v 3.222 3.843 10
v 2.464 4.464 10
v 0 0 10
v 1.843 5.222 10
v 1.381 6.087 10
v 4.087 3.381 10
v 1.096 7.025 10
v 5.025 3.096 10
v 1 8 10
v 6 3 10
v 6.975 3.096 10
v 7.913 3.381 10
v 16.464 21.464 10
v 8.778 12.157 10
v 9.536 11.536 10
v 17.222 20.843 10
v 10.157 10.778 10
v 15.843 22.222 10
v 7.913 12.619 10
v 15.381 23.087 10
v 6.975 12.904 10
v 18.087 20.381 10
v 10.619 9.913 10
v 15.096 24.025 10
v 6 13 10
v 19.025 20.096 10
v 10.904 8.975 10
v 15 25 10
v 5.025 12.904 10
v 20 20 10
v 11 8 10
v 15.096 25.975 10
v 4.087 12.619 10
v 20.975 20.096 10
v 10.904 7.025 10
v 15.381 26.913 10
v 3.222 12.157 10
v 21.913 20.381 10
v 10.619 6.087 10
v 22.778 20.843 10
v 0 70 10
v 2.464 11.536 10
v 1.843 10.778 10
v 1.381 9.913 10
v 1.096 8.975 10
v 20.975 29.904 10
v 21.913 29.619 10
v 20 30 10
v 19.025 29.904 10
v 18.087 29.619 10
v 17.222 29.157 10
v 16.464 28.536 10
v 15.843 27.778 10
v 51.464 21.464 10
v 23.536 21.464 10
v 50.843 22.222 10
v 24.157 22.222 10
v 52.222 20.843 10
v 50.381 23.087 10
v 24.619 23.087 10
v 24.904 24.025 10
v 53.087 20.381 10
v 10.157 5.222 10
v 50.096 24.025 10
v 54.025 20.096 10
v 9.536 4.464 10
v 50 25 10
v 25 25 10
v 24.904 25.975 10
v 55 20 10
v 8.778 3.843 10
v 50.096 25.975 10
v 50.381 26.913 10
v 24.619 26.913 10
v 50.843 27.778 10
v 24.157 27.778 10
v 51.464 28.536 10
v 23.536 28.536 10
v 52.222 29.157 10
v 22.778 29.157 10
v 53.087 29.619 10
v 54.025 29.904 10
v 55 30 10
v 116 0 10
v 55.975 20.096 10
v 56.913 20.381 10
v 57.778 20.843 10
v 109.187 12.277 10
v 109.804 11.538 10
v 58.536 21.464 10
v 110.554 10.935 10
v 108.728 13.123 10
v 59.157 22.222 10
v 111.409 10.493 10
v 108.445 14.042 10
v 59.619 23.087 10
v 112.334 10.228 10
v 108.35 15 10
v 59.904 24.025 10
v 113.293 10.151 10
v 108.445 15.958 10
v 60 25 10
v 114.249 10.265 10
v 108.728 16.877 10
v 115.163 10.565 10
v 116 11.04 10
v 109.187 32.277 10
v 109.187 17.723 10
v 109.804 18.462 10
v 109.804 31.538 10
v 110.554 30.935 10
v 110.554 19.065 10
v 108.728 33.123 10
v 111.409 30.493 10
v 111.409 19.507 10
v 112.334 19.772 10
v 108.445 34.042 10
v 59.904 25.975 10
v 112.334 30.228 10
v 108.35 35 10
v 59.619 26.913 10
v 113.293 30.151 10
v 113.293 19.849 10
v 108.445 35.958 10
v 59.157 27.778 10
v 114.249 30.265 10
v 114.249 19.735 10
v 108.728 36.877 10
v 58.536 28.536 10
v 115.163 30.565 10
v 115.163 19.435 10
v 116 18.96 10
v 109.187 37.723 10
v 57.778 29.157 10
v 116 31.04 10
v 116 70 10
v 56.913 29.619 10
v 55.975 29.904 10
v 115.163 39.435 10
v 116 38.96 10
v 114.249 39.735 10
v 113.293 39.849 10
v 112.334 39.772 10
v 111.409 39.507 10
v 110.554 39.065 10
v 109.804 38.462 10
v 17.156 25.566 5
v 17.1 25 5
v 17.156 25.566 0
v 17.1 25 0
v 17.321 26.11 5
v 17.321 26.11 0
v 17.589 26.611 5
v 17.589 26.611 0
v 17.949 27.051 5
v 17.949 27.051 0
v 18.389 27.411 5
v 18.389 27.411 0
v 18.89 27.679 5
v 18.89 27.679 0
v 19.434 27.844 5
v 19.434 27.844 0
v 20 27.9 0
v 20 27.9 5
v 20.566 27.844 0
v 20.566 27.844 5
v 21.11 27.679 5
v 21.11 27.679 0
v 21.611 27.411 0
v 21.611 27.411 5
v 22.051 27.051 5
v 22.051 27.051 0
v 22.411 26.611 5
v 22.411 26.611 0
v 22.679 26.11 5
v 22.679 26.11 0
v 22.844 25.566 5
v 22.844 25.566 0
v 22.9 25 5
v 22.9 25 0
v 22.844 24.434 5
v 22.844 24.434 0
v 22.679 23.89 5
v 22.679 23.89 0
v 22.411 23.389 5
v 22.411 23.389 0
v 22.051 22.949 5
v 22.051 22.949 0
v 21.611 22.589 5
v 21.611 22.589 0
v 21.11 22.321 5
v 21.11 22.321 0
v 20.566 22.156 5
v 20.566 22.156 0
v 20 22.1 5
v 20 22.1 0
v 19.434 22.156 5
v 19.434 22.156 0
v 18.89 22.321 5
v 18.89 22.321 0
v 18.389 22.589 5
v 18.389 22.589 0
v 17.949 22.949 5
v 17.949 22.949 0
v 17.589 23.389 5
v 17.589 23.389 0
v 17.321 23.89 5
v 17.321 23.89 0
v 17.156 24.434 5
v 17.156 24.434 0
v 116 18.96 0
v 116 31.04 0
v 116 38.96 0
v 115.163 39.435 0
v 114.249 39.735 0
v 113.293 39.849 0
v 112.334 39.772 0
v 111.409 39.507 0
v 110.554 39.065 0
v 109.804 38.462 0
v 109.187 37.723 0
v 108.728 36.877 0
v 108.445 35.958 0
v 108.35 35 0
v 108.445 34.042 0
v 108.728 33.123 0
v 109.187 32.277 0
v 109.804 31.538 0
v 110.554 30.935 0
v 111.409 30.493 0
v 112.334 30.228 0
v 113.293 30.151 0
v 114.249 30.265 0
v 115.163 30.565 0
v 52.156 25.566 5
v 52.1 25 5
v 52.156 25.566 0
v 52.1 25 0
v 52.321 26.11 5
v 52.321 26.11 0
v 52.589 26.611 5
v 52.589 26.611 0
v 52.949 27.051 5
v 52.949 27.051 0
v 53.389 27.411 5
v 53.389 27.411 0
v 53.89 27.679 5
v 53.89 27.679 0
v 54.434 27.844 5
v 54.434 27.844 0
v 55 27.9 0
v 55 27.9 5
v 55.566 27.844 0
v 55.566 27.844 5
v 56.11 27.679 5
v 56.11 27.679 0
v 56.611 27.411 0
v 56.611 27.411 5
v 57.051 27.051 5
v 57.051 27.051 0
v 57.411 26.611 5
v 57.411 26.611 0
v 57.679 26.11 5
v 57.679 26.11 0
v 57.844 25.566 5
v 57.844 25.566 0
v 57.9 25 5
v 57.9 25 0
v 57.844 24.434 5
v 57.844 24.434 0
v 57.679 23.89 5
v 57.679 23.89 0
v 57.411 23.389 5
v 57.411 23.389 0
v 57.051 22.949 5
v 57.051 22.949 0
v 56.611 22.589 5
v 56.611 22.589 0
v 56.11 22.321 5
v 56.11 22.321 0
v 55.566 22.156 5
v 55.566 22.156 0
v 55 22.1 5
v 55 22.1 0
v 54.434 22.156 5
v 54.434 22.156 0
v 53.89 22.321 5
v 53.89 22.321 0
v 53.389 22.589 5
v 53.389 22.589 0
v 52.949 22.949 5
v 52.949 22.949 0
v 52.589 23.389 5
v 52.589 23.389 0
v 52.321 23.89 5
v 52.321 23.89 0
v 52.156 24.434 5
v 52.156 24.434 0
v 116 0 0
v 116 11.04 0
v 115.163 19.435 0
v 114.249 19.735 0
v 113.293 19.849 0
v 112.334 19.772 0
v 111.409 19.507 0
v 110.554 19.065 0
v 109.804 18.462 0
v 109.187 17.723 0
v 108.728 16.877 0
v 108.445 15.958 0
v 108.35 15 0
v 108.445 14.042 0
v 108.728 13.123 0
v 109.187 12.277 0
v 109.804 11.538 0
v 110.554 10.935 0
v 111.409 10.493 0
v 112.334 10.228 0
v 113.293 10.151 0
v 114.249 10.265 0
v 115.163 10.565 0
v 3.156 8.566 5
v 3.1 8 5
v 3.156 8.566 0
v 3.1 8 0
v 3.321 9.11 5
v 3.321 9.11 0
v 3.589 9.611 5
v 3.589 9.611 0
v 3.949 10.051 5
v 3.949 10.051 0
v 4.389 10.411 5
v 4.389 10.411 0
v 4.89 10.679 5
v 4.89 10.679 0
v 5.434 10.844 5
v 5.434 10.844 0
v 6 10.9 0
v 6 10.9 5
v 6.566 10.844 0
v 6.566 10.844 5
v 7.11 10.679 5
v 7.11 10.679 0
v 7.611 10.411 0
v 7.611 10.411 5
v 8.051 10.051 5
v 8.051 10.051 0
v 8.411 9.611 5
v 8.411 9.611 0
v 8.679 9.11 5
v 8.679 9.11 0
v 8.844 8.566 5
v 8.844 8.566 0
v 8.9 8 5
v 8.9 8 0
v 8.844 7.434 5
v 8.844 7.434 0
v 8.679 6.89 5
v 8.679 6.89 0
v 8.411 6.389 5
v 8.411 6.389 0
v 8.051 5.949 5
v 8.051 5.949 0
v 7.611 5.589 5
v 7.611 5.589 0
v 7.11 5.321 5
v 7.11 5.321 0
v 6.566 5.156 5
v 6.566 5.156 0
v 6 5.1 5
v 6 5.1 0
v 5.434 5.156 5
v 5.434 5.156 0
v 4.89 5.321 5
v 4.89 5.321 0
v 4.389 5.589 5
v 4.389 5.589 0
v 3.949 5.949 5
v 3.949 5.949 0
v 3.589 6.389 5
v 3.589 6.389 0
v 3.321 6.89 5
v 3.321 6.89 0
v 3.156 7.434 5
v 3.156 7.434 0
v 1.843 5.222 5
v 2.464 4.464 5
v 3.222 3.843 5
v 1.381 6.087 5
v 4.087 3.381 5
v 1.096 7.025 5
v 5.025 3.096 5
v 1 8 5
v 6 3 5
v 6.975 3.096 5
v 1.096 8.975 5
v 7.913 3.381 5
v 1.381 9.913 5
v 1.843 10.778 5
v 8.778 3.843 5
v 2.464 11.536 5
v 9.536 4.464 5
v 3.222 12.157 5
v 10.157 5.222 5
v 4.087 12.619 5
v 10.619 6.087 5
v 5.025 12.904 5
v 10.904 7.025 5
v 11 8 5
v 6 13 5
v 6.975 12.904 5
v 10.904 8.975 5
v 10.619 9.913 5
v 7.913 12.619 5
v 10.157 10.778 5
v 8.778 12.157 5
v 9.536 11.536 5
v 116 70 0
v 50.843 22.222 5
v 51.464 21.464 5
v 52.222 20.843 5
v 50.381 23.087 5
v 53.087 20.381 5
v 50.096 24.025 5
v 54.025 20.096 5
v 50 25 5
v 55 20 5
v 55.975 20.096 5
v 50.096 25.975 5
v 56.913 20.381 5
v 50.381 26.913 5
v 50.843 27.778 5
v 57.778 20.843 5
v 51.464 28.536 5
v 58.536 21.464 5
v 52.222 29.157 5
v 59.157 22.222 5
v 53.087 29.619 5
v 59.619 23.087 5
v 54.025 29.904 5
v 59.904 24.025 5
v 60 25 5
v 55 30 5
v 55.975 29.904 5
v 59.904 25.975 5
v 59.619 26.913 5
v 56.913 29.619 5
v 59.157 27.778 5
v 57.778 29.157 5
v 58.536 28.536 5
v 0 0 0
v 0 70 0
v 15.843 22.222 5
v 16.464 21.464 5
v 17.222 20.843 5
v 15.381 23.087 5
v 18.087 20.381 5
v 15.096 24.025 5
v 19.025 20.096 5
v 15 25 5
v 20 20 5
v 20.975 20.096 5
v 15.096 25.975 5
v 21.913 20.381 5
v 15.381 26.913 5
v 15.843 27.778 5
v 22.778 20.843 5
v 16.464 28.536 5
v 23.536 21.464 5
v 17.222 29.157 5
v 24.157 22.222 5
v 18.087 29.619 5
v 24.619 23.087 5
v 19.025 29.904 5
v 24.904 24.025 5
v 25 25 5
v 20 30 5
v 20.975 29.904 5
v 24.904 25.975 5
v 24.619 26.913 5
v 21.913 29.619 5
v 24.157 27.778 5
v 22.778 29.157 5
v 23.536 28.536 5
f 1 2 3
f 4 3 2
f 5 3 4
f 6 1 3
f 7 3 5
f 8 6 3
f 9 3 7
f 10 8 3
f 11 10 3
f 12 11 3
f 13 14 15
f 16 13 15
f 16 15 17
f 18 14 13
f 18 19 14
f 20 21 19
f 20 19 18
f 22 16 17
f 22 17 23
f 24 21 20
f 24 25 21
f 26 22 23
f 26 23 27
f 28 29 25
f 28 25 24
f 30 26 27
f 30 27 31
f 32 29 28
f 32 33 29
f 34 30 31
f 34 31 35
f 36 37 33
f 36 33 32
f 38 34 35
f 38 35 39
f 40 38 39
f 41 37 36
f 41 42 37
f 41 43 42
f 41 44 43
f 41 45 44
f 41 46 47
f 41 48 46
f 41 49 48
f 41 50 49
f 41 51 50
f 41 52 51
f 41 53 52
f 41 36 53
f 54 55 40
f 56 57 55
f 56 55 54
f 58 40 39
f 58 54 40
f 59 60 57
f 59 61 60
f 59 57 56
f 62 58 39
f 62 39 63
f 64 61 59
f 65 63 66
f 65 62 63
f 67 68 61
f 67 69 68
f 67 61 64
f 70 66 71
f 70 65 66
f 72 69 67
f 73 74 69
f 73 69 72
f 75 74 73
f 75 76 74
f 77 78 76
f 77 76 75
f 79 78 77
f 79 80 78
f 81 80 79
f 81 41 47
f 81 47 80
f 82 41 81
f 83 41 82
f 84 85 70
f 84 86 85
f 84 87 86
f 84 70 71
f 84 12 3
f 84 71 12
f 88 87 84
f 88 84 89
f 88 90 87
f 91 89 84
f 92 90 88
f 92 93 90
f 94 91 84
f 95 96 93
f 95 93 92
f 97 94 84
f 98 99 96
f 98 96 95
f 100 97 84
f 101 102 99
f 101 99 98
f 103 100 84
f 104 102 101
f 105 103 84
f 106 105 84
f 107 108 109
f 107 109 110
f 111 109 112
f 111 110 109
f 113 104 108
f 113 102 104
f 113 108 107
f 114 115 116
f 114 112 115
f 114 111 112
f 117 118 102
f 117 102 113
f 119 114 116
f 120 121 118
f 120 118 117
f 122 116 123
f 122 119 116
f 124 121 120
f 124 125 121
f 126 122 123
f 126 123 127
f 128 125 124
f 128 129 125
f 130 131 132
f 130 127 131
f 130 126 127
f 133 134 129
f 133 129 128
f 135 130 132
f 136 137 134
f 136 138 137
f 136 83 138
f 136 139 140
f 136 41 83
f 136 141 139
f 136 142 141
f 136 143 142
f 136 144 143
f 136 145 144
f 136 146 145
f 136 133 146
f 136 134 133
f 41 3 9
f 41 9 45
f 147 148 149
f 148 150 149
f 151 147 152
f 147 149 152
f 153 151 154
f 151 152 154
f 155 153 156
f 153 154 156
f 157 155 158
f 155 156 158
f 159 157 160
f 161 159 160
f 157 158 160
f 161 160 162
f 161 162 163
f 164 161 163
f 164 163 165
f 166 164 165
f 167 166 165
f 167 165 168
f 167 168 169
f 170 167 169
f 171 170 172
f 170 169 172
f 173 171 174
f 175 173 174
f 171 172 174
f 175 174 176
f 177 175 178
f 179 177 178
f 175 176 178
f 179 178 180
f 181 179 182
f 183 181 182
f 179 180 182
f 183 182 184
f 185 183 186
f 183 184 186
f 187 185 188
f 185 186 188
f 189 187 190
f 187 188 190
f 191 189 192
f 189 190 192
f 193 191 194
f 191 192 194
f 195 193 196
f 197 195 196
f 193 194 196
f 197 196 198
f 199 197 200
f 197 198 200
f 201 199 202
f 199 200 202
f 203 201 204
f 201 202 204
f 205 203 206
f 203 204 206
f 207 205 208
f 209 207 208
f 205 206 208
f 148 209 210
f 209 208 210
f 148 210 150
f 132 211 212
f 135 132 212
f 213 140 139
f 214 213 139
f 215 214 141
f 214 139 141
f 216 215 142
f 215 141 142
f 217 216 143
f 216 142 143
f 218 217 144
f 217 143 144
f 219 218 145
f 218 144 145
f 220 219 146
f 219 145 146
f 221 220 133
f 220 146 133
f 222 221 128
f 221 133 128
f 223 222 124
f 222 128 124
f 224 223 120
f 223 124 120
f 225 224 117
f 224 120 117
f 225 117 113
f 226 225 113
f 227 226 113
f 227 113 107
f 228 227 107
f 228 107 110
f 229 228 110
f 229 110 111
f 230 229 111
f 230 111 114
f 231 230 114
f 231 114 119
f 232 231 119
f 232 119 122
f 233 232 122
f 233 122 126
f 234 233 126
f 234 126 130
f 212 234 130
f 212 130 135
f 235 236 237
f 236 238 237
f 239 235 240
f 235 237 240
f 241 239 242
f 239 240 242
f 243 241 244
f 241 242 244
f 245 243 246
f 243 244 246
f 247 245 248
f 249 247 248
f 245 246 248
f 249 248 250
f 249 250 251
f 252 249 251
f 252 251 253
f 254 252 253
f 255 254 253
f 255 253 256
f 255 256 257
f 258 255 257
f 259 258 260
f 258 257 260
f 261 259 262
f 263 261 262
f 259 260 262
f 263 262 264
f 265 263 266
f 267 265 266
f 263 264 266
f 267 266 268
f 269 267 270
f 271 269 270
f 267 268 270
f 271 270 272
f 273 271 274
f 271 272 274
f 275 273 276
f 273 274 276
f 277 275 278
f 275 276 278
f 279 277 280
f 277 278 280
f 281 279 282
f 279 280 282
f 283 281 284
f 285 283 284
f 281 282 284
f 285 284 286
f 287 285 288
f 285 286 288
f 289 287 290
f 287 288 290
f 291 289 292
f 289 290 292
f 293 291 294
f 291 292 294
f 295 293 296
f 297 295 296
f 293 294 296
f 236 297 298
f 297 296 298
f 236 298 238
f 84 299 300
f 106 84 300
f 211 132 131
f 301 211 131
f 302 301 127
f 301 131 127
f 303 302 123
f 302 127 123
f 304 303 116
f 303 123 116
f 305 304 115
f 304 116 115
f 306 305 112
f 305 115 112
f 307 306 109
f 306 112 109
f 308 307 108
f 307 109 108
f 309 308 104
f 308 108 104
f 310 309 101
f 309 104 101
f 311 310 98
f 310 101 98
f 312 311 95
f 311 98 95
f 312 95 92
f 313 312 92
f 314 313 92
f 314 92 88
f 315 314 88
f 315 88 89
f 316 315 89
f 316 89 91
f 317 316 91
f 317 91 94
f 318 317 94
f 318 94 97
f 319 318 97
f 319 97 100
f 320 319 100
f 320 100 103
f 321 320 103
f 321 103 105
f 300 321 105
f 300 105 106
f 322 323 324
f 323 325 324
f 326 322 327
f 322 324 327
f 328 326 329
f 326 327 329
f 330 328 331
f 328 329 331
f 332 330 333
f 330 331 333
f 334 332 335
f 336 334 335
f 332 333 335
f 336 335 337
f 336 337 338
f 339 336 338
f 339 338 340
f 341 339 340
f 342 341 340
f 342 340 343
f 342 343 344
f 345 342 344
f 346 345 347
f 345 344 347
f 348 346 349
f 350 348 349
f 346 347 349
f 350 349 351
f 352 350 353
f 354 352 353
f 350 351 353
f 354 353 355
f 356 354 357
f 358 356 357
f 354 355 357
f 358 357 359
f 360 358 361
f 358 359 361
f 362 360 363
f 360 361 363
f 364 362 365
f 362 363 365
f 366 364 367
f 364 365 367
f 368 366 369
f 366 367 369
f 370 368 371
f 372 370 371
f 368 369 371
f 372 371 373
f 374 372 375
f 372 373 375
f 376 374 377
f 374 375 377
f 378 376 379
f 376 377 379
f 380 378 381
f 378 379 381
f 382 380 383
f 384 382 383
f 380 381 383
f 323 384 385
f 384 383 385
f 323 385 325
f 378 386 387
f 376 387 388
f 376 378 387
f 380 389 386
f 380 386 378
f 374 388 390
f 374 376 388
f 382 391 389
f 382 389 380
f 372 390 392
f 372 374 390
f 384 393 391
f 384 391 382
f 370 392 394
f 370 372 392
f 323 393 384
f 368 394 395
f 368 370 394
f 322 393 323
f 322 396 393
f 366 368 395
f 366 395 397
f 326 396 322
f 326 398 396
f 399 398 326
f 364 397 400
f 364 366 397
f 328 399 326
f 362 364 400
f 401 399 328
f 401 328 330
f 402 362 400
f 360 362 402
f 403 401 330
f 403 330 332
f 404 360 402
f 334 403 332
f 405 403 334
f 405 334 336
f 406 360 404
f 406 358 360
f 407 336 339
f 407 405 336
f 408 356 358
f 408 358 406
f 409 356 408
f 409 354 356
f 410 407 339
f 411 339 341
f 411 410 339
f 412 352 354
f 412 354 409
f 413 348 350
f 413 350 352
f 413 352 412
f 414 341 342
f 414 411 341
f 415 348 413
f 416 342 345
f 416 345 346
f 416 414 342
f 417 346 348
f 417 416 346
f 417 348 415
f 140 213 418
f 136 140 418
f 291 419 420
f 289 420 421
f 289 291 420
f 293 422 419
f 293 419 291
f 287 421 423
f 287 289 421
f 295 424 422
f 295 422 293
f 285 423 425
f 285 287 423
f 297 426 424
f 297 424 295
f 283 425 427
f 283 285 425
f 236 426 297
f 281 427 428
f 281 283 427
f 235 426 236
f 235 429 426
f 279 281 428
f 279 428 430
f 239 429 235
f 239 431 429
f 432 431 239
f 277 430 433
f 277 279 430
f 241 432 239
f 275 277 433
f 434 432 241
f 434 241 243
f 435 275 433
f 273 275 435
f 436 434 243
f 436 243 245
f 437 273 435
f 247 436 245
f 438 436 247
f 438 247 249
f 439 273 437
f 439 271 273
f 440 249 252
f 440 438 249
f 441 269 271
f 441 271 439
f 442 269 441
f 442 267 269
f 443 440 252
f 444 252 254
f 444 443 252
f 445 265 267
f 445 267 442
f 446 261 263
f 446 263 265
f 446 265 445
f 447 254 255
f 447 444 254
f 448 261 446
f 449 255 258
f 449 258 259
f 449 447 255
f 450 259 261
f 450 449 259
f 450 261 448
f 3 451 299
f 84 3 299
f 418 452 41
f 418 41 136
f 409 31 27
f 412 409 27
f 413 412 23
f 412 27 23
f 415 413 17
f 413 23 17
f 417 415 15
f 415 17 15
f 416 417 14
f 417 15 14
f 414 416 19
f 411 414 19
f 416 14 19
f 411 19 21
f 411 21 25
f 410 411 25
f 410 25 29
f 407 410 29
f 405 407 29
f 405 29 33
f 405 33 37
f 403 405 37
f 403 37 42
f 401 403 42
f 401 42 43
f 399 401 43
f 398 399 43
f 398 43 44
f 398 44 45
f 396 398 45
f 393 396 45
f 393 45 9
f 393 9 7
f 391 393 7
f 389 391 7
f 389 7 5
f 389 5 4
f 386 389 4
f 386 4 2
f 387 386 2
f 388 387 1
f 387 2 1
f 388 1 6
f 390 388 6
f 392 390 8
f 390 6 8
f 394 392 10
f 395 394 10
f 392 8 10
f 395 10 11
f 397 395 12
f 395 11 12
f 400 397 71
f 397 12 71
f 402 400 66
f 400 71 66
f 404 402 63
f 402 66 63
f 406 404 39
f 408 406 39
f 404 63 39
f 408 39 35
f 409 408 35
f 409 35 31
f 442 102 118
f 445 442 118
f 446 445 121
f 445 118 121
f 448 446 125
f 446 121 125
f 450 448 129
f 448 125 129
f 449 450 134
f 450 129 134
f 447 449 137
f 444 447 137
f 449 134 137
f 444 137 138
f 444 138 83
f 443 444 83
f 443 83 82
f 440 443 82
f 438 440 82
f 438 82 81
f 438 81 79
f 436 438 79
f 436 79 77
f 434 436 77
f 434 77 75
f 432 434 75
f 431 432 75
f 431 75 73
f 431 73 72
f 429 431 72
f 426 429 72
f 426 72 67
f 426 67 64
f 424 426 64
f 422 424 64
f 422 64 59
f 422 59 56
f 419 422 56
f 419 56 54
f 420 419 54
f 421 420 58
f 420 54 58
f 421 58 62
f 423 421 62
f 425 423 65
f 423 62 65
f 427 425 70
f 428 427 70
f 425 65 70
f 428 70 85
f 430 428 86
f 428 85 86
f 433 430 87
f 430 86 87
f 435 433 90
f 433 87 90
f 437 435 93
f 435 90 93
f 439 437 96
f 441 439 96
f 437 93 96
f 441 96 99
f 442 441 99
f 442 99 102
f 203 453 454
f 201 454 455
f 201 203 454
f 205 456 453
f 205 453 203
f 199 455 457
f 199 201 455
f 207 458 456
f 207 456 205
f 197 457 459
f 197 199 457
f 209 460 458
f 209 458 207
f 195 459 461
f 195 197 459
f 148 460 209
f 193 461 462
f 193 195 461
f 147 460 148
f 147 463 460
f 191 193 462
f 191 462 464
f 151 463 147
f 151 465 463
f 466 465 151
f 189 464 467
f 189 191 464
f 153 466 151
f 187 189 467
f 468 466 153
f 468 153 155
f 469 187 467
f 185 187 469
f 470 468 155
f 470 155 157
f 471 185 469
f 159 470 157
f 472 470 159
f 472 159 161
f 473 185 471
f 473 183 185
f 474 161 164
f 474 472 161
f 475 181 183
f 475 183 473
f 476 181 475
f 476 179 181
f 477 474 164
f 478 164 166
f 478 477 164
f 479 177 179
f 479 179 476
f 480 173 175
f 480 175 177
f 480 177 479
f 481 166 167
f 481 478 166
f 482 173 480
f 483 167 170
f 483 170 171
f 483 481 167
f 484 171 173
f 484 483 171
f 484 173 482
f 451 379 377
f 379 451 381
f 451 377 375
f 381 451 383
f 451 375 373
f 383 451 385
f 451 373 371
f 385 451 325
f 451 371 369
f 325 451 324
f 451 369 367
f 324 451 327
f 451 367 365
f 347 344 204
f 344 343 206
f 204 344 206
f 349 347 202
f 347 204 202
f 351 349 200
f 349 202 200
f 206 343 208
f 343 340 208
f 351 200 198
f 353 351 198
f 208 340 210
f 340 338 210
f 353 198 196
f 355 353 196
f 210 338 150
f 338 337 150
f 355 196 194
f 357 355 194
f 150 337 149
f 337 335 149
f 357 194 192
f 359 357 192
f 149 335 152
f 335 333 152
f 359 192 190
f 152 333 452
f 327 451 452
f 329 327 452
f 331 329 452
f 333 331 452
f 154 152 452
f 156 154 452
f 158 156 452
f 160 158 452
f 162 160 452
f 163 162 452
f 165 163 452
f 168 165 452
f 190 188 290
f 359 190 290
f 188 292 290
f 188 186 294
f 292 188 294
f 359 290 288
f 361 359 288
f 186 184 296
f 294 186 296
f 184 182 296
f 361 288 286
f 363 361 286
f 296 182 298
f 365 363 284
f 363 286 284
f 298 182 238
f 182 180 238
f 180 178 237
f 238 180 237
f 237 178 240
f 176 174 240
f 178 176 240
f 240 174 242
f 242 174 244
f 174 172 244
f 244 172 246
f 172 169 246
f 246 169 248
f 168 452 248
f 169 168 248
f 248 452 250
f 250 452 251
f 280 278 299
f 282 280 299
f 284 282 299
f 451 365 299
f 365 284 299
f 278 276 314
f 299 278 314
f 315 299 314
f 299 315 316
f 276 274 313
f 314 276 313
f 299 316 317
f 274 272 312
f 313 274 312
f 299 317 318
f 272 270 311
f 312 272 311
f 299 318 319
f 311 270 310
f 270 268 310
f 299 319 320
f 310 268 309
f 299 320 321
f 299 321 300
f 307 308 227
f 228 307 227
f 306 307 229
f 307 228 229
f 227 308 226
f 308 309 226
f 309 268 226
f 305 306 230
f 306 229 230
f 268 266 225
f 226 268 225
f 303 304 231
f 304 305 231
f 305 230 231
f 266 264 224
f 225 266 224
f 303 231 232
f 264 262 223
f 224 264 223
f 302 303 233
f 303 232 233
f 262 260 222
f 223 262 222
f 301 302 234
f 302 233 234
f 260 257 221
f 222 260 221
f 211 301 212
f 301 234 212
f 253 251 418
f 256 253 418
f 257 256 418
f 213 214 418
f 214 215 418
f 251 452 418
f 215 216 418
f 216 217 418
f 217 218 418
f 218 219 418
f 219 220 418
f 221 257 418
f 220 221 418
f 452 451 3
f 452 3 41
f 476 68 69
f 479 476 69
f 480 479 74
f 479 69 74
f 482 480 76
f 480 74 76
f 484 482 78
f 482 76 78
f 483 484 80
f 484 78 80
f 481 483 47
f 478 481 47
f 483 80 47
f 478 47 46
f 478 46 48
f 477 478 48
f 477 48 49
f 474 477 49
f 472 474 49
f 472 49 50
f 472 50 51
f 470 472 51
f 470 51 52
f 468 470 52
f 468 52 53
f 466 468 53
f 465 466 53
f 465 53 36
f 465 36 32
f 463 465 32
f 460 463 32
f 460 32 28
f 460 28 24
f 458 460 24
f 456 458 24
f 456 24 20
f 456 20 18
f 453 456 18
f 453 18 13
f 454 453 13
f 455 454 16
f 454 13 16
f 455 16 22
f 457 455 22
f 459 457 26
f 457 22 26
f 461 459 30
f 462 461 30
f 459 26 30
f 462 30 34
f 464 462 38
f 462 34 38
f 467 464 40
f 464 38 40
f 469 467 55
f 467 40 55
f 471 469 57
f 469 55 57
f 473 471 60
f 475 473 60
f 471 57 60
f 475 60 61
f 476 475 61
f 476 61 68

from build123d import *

# Parameters (mm, degrees)
SKETCH_1_W                   = 116
SKETCH_1_H                   = 70
EXTRUDE_1_DEPTH              = 10
SKETCH_2_R                   = 4.85
CUT_EXTRUDE_1_DEPTH          = 136.852861582
HOLE_WIZARD_M5_1_D           = 5.8
HOLE_WIZARD_M5_1_CBORE_D     = 10
HOLE_WIZARD_M5_1_CBORE_DEPTH = 5


with BuildPart() as part:
    # 草图1 → 凸台-拉伸1 (new body)
    with BuildSketch(Plane.XY):
        with Locations((58, 35)):
            Rectangle(SKETCH_1_W, SKETCH_1_H)
    extrude(amount=EXTRUDE_1_DEPTH)

    # 草图2 → 切除-拉伸1 (cut, through all)
    with BuildSketch(Plane.XY.offset(10)):
        with Locations((113.2, 35)):
            Circle(SKETCH_2_R)
        with Locations((113.2, 15)):
            Circle(SKETCH_2_R)
    extrude(amount=-CUT_EXTRUDE_1_DEPTH, mode=Mode.SUBTRACT)

    # M5 六角凹头螺钉的柱形沉头孔1 (through all)
    with Locations(Plane.XY.offset(10)):
        with Locations((6, 8), (20, 25), (55, 25)):
            CounterBoreHole(HOLE_WIZARD_M5_1_D / 2, HOLE_WIZARD_M5_1_CBORE_D / 2, HOLE_WIZARD_M5_1_CBORE_DEPTH)


solid = part.part
